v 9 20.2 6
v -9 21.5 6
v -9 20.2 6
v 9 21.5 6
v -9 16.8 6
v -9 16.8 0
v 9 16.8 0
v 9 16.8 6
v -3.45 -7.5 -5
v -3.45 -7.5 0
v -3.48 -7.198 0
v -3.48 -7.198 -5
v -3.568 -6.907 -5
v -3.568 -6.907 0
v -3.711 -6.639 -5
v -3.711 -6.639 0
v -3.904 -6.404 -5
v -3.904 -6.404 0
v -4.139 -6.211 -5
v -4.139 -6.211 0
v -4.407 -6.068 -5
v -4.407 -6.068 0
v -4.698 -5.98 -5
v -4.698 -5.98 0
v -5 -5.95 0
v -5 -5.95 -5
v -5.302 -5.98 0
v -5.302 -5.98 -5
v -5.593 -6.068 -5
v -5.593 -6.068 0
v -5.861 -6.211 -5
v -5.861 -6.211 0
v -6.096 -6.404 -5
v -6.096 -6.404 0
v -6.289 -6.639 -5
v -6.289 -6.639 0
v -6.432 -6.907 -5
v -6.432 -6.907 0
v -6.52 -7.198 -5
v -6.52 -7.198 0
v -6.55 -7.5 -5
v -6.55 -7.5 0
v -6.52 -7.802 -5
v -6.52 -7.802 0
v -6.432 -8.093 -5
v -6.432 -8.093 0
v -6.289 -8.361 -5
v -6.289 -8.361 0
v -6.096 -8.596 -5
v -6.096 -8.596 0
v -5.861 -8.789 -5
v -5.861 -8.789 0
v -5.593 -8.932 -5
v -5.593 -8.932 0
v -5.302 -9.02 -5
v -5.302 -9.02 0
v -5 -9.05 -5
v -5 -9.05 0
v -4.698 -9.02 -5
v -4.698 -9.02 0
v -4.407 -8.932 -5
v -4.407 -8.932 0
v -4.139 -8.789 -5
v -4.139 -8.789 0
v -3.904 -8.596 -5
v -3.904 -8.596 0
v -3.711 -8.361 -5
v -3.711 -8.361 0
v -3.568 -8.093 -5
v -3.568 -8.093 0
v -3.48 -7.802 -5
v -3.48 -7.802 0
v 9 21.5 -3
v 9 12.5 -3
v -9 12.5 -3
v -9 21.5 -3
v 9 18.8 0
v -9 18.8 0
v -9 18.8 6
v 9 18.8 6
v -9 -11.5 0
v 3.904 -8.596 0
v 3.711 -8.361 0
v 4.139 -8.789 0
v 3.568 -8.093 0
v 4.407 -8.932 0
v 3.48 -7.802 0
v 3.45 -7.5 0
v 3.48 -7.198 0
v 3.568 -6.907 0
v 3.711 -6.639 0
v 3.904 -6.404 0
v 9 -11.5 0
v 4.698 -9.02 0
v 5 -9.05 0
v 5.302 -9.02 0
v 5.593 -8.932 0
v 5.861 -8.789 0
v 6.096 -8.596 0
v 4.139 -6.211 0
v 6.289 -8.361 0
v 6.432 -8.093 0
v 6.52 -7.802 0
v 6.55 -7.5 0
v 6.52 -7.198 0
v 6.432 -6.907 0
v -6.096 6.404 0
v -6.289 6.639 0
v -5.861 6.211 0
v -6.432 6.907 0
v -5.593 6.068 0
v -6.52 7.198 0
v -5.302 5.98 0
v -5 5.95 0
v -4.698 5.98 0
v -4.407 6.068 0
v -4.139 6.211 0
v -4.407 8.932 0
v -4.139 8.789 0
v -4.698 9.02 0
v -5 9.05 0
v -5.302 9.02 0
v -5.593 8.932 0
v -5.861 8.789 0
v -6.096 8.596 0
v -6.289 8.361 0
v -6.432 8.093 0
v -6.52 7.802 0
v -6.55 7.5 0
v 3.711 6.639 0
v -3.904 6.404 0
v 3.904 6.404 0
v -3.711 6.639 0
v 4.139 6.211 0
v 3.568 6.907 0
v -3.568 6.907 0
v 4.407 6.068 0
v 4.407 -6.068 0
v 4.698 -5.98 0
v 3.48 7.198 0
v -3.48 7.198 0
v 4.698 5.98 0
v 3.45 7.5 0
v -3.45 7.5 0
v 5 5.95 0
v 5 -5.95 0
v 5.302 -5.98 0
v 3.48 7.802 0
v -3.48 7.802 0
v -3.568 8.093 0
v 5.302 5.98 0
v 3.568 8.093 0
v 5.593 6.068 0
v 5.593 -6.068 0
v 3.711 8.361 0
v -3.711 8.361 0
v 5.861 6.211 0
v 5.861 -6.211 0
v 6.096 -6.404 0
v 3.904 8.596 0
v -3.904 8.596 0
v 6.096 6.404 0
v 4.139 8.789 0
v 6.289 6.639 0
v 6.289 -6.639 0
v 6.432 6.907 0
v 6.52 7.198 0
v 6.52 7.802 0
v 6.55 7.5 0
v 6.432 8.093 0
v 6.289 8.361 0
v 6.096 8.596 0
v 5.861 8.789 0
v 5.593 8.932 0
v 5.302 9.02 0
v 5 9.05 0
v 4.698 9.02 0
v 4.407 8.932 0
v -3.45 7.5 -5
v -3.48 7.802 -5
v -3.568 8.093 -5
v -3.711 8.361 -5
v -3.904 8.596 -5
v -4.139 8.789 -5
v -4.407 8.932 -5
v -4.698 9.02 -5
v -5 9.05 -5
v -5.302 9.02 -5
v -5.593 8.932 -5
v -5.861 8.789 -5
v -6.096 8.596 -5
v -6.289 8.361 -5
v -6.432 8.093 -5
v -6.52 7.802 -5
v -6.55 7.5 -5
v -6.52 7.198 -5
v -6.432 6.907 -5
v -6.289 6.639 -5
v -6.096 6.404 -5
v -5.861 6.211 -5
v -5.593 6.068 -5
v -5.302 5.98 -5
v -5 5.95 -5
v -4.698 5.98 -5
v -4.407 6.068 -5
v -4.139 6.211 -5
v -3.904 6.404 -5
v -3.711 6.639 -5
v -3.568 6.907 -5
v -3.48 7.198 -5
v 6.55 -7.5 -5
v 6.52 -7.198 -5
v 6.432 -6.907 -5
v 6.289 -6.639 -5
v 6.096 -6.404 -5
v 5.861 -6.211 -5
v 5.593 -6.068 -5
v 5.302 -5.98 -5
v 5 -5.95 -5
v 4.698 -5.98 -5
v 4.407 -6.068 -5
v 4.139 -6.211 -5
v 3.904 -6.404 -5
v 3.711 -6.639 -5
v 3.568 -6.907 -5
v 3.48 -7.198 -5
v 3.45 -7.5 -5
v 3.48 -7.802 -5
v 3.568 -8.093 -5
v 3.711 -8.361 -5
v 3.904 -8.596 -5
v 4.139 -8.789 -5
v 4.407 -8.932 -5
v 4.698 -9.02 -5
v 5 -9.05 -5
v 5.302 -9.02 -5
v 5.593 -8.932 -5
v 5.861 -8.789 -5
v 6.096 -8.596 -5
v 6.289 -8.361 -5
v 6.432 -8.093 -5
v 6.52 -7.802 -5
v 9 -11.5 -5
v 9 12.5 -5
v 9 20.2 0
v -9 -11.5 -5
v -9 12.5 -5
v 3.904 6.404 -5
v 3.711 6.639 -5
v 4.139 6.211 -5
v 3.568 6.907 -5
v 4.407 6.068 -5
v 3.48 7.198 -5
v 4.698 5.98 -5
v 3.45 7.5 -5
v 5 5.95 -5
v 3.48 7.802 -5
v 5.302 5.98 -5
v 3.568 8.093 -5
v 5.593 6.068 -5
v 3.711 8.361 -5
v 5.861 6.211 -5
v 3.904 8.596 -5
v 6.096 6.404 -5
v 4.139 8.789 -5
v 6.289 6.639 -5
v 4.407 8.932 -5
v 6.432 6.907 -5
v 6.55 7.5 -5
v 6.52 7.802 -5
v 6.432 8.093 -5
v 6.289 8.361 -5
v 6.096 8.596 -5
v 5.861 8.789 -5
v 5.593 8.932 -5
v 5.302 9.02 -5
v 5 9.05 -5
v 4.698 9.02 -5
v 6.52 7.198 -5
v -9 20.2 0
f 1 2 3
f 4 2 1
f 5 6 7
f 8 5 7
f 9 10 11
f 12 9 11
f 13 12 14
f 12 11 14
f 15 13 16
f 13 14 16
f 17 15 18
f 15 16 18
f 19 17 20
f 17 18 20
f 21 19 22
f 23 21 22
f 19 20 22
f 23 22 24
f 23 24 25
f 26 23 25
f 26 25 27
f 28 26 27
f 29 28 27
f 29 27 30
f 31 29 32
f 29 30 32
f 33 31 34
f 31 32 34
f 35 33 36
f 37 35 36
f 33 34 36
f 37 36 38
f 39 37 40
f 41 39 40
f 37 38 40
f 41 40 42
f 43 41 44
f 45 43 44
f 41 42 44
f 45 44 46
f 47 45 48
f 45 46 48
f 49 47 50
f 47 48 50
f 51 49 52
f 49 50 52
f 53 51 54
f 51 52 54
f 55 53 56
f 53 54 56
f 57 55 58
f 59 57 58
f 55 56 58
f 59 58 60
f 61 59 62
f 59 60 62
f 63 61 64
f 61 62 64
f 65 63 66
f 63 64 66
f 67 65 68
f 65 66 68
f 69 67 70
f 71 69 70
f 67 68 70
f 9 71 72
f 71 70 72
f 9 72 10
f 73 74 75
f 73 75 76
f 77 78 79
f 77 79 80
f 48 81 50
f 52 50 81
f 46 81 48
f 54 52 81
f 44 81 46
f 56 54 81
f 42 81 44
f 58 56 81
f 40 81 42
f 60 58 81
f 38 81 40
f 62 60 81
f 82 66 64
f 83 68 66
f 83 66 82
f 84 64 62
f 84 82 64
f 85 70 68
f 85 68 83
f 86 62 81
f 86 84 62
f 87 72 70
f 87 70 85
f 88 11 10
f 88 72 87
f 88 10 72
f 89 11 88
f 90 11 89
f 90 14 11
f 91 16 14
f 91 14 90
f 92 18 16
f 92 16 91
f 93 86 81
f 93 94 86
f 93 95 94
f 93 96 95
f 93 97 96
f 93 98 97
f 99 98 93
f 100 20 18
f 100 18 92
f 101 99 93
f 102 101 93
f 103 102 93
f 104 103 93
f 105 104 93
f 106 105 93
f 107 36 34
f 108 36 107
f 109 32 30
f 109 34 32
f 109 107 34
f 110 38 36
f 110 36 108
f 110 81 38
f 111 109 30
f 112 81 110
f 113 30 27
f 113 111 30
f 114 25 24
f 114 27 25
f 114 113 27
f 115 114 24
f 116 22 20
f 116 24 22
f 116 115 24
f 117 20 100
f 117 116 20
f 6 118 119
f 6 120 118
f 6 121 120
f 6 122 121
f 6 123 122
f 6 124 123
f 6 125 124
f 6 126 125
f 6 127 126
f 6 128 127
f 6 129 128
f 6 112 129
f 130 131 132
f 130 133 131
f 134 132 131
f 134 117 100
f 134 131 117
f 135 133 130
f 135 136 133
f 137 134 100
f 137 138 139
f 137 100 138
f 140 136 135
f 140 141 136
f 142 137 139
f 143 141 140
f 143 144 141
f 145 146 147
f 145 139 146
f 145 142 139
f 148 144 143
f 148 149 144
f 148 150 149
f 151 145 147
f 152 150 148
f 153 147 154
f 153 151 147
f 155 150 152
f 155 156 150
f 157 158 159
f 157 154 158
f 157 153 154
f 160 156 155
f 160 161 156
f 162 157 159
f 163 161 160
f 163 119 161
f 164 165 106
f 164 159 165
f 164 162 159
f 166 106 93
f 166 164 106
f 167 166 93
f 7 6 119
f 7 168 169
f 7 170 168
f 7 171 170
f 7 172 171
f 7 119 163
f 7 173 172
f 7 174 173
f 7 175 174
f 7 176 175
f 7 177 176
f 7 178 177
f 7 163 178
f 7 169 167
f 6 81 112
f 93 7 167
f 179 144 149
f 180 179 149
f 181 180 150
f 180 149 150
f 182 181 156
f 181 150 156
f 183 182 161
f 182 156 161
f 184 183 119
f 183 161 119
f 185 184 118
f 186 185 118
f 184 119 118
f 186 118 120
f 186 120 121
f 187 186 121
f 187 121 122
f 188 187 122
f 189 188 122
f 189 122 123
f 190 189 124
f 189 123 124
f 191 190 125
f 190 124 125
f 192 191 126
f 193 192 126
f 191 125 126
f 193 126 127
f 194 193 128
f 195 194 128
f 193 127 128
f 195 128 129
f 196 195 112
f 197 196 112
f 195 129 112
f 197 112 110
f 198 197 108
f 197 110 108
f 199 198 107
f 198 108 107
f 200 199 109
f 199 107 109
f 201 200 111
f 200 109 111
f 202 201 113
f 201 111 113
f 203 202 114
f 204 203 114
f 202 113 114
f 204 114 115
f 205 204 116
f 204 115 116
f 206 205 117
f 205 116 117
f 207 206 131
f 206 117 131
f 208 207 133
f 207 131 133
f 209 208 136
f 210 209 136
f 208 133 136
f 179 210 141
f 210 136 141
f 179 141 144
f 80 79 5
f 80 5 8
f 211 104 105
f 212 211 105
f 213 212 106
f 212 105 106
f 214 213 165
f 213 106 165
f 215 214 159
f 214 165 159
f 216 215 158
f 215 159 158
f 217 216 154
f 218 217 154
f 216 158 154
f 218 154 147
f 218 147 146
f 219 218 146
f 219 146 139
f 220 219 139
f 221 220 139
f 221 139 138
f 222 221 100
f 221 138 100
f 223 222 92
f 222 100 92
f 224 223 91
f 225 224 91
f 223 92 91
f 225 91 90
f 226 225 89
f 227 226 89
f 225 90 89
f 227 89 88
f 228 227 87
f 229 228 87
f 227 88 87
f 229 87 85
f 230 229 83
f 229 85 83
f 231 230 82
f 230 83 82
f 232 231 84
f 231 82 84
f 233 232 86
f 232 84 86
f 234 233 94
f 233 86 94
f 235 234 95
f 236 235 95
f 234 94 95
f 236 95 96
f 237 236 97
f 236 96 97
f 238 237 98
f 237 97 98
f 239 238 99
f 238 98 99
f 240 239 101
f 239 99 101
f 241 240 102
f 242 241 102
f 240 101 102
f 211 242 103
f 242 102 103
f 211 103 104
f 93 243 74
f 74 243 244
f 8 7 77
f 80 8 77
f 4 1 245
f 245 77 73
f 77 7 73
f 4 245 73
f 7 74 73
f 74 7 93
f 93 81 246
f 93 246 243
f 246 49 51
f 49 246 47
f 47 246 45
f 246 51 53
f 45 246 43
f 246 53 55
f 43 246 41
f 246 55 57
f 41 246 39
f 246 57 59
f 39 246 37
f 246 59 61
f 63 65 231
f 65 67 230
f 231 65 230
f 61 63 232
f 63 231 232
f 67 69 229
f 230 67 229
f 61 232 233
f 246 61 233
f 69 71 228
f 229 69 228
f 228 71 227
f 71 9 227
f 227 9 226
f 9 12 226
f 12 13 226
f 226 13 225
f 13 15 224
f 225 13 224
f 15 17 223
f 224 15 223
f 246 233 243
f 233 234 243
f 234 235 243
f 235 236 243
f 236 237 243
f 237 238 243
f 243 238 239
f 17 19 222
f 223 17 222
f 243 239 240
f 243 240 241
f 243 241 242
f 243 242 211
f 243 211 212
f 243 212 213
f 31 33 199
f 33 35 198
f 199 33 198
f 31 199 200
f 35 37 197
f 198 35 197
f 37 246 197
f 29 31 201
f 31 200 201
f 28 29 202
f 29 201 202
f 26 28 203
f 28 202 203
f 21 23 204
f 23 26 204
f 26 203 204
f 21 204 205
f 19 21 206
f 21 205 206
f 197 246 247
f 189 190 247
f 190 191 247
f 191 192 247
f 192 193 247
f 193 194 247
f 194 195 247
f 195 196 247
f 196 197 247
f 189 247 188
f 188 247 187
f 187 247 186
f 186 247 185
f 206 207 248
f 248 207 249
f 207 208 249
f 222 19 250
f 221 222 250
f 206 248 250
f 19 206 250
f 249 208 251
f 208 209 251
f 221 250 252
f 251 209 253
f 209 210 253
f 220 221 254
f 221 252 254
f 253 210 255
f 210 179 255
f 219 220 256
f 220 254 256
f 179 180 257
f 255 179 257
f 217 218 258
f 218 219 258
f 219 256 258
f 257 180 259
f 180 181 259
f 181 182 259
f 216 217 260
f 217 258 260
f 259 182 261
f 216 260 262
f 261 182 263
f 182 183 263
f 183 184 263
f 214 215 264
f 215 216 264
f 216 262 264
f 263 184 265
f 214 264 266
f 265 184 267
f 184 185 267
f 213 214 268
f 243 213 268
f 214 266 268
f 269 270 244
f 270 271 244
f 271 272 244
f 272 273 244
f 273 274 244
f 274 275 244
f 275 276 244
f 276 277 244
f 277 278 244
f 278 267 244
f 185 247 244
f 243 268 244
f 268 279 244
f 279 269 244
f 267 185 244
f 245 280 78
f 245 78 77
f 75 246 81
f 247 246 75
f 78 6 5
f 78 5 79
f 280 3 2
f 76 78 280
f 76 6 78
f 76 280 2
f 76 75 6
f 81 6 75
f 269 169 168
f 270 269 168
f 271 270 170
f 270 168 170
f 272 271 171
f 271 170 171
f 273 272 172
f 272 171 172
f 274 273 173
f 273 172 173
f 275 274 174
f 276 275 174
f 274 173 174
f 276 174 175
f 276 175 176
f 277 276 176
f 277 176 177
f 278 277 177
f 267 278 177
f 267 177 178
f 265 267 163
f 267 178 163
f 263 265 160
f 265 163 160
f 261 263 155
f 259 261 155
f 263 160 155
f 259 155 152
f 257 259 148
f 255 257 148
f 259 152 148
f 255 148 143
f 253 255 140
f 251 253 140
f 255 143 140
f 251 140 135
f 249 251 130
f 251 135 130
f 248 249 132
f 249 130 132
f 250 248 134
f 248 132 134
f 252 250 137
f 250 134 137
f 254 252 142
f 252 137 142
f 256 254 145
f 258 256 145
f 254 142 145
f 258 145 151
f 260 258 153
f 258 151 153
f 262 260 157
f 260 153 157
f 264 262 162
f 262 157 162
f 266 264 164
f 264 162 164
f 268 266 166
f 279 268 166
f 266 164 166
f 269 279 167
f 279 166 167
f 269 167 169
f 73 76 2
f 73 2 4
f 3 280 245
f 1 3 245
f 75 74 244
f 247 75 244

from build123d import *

# Parameters (mm, degrees)
SKIZZE1_W                       = 18
SKIZZE1_H                       = 33
SKIZZE1_R                       = 1.55
AUFSATZ_LINEAR_AUSTRAGEN3_DEPTH = 5
SKIZZE1_4_W                     = 18
SKIZZE1_4_H                     = 2
SKIZZE1_4_H_2                   = 1.3
AUFSATZ_LINEAR_AUSTRAGEN4_DEPTH = 6
SKIZZE2_W                       = 2
SKIZZE2_H                       = 9
SCHNITT_LINEAR_AUSTRAGEN1_DEPTH = 29.674901918


with BuildPart() as part:
    # Skizze1 → Aufsatz-Linear austragen3 (new body)
    with BuildSketch(Plane.XY):
        with Locations((0, 5)):
            Rectangle(SKIZZE1_W, SKIZZE1_H)
        with Locations((5, 7.5)):
            Circle(SKIZZE1_R, mode=Mode.SUBTRACT)
        with Locations((-5, -7.5)):
            Circle(SKIZZE1_R, mode=Mode.SUBTRACT)
        with Locations((5, -7.5)):
            Circle(SKIZZE1_R, mode=Mode.SUBTRACT)
        with Locations((-5, 7.5)):
            Circle(SKIZZE1_R, mode=Mode.SUBTRACT)
    extrude(amount=-AUFSATZ_LINEAR_AUSTRAGEN3_DEPTH)

    # Skizze1<4> → Aufsatz-Linear austragen4 (add)
    with BuildSketch(Plane.XY):
        with Locations((0, 17.8)):
            Rectangle(SKIZZE1_4_W, SKIZZE1_4_H)
        with Locations((0, 20.85)):
            Rectangle(SKIZZE1_4_W, SKIZZE1_4_H_2)
    extrude(amount=AUFSATZ_LINEAR_AUSTRAGEN4_DEPTH)

    # Skizze2 → Schnitt-Linear austragen1 (cut, through all)
    with BuildSketch(Plane(origin=(9, 0, 0), x_dir=(0, 0, -1), z_dir=(1, 0, 0))):
        with Locations((4, 17)):
            Rectangle(SKIZZE2_W, SKIZZE2_H)
    extrude(amount=-SCHNITT_LINEAR_AUSTRAGEN1_DEPTH, mode=Mode.SUBTRACT)


solid = part.part
